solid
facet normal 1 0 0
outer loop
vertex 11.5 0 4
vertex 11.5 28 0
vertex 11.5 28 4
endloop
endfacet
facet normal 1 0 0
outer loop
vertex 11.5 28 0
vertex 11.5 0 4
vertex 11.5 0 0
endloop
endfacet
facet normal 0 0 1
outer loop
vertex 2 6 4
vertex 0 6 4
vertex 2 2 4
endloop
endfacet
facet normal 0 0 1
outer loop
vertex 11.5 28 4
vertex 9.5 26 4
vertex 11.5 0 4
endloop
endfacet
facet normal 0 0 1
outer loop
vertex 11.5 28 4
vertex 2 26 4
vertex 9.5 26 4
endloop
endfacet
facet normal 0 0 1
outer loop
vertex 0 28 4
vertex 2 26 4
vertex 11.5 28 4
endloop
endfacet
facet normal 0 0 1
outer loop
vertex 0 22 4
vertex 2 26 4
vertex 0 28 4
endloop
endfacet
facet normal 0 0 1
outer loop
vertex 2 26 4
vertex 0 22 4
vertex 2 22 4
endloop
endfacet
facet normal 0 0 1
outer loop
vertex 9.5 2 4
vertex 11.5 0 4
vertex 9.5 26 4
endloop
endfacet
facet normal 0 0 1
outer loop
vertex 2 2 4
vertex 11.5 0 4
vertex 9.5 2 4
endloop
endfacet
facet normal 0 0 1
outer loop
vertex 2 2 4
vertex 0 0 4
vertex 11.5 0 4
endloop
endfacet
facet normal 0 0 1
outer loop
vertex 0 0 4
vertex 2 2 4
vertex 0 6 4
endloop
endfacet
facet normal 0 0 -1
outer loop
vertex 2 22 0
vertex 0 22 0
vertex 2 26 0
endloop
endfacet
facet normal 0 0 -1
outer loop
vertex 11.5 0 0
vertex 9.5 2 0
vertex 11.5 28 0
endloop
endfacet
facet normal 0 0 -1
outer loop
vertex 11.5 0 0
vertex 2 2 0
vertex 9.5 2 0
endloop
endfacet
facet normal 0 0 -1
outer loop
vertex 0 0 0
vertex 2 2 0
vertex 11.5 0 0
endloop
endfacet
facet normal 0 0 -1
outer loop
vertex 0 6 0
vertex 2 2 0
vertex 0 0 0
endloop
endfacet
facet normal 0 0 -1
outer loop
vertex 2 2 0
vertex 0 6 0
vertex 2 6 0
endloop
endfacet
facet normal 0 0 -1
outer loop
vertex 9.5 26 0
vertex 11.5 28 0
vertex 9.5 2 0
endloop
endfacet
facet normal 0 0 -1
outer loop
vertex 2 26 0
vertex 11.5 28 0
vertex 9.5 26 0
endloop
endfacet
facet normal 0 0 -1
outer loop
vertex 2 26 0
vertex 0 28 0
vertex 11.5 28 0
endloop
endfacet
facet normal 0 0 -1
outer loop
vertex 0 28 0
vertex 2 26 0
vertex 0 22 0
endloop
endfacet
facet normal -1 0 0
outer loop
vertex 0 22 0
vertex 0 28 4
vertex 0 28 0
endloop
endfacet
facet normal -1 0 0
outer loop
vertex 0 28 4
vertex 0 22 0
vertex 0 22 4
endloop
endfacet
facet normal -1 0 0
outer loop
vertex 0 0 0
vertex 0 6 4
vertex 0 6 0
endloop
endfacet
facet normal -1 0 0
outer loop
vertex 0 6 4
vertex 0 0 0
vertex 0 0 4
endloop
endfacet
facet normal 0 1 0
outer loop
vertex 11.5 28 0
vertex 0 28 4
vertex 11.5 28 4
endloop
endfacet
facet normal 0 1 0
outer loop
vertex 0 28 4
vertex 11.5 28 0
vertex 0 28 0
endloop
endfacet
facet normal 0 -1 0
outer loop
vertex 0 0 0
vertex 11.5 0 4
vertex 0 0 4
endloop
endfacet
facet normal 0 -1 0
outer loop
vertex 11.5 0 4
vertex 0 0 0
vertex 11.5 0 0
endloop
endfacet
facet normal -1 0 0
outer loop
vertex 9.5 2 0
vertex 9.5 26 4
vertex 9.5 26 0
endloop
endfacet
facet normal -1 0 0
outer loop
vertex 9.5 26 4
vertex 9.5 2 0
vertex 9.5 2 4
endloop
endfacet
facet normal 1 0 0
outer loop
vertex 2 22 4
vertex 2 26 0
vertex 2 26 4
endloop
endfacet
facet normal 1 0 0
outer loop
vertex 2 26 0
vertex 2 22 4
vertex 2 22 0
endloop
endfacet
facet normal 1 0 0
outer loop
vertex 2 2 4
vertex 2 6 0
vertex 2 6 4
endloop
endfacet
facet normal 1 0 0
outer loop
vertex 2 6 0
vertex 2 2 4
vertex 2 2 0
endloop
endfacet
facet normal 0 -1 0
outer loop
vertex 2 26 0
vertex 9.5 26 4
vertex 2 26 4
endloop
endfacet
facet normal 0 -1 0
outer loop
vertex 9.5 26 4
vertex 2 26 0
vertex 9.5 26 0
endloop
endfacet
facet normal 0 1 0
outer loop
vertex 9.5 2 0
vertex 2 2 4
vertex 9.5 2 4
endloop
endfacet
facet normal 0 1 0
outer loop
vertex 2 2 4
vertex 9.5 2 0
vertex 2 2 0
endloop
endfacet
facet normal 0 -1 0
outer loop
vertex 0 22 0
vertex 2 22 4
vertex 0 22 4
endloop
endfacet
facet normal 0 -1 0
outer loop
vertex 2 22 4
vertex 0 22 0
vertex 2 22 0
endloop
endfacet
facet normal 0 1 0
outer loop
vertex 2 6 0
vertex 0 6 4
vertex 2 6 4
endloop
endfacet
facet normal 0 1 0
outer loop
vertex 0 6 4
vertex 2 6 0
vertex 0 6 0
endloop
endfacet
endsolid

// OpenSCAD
difference() {
    cube([7.5+2+2, 24+2+2, 4]);
    translate([2,2,0]) {
        cube([7.5, 24, 4]);
    }
    
    translate([0,6,0]) {
        cube([2, 16, 4]);
    }
}
